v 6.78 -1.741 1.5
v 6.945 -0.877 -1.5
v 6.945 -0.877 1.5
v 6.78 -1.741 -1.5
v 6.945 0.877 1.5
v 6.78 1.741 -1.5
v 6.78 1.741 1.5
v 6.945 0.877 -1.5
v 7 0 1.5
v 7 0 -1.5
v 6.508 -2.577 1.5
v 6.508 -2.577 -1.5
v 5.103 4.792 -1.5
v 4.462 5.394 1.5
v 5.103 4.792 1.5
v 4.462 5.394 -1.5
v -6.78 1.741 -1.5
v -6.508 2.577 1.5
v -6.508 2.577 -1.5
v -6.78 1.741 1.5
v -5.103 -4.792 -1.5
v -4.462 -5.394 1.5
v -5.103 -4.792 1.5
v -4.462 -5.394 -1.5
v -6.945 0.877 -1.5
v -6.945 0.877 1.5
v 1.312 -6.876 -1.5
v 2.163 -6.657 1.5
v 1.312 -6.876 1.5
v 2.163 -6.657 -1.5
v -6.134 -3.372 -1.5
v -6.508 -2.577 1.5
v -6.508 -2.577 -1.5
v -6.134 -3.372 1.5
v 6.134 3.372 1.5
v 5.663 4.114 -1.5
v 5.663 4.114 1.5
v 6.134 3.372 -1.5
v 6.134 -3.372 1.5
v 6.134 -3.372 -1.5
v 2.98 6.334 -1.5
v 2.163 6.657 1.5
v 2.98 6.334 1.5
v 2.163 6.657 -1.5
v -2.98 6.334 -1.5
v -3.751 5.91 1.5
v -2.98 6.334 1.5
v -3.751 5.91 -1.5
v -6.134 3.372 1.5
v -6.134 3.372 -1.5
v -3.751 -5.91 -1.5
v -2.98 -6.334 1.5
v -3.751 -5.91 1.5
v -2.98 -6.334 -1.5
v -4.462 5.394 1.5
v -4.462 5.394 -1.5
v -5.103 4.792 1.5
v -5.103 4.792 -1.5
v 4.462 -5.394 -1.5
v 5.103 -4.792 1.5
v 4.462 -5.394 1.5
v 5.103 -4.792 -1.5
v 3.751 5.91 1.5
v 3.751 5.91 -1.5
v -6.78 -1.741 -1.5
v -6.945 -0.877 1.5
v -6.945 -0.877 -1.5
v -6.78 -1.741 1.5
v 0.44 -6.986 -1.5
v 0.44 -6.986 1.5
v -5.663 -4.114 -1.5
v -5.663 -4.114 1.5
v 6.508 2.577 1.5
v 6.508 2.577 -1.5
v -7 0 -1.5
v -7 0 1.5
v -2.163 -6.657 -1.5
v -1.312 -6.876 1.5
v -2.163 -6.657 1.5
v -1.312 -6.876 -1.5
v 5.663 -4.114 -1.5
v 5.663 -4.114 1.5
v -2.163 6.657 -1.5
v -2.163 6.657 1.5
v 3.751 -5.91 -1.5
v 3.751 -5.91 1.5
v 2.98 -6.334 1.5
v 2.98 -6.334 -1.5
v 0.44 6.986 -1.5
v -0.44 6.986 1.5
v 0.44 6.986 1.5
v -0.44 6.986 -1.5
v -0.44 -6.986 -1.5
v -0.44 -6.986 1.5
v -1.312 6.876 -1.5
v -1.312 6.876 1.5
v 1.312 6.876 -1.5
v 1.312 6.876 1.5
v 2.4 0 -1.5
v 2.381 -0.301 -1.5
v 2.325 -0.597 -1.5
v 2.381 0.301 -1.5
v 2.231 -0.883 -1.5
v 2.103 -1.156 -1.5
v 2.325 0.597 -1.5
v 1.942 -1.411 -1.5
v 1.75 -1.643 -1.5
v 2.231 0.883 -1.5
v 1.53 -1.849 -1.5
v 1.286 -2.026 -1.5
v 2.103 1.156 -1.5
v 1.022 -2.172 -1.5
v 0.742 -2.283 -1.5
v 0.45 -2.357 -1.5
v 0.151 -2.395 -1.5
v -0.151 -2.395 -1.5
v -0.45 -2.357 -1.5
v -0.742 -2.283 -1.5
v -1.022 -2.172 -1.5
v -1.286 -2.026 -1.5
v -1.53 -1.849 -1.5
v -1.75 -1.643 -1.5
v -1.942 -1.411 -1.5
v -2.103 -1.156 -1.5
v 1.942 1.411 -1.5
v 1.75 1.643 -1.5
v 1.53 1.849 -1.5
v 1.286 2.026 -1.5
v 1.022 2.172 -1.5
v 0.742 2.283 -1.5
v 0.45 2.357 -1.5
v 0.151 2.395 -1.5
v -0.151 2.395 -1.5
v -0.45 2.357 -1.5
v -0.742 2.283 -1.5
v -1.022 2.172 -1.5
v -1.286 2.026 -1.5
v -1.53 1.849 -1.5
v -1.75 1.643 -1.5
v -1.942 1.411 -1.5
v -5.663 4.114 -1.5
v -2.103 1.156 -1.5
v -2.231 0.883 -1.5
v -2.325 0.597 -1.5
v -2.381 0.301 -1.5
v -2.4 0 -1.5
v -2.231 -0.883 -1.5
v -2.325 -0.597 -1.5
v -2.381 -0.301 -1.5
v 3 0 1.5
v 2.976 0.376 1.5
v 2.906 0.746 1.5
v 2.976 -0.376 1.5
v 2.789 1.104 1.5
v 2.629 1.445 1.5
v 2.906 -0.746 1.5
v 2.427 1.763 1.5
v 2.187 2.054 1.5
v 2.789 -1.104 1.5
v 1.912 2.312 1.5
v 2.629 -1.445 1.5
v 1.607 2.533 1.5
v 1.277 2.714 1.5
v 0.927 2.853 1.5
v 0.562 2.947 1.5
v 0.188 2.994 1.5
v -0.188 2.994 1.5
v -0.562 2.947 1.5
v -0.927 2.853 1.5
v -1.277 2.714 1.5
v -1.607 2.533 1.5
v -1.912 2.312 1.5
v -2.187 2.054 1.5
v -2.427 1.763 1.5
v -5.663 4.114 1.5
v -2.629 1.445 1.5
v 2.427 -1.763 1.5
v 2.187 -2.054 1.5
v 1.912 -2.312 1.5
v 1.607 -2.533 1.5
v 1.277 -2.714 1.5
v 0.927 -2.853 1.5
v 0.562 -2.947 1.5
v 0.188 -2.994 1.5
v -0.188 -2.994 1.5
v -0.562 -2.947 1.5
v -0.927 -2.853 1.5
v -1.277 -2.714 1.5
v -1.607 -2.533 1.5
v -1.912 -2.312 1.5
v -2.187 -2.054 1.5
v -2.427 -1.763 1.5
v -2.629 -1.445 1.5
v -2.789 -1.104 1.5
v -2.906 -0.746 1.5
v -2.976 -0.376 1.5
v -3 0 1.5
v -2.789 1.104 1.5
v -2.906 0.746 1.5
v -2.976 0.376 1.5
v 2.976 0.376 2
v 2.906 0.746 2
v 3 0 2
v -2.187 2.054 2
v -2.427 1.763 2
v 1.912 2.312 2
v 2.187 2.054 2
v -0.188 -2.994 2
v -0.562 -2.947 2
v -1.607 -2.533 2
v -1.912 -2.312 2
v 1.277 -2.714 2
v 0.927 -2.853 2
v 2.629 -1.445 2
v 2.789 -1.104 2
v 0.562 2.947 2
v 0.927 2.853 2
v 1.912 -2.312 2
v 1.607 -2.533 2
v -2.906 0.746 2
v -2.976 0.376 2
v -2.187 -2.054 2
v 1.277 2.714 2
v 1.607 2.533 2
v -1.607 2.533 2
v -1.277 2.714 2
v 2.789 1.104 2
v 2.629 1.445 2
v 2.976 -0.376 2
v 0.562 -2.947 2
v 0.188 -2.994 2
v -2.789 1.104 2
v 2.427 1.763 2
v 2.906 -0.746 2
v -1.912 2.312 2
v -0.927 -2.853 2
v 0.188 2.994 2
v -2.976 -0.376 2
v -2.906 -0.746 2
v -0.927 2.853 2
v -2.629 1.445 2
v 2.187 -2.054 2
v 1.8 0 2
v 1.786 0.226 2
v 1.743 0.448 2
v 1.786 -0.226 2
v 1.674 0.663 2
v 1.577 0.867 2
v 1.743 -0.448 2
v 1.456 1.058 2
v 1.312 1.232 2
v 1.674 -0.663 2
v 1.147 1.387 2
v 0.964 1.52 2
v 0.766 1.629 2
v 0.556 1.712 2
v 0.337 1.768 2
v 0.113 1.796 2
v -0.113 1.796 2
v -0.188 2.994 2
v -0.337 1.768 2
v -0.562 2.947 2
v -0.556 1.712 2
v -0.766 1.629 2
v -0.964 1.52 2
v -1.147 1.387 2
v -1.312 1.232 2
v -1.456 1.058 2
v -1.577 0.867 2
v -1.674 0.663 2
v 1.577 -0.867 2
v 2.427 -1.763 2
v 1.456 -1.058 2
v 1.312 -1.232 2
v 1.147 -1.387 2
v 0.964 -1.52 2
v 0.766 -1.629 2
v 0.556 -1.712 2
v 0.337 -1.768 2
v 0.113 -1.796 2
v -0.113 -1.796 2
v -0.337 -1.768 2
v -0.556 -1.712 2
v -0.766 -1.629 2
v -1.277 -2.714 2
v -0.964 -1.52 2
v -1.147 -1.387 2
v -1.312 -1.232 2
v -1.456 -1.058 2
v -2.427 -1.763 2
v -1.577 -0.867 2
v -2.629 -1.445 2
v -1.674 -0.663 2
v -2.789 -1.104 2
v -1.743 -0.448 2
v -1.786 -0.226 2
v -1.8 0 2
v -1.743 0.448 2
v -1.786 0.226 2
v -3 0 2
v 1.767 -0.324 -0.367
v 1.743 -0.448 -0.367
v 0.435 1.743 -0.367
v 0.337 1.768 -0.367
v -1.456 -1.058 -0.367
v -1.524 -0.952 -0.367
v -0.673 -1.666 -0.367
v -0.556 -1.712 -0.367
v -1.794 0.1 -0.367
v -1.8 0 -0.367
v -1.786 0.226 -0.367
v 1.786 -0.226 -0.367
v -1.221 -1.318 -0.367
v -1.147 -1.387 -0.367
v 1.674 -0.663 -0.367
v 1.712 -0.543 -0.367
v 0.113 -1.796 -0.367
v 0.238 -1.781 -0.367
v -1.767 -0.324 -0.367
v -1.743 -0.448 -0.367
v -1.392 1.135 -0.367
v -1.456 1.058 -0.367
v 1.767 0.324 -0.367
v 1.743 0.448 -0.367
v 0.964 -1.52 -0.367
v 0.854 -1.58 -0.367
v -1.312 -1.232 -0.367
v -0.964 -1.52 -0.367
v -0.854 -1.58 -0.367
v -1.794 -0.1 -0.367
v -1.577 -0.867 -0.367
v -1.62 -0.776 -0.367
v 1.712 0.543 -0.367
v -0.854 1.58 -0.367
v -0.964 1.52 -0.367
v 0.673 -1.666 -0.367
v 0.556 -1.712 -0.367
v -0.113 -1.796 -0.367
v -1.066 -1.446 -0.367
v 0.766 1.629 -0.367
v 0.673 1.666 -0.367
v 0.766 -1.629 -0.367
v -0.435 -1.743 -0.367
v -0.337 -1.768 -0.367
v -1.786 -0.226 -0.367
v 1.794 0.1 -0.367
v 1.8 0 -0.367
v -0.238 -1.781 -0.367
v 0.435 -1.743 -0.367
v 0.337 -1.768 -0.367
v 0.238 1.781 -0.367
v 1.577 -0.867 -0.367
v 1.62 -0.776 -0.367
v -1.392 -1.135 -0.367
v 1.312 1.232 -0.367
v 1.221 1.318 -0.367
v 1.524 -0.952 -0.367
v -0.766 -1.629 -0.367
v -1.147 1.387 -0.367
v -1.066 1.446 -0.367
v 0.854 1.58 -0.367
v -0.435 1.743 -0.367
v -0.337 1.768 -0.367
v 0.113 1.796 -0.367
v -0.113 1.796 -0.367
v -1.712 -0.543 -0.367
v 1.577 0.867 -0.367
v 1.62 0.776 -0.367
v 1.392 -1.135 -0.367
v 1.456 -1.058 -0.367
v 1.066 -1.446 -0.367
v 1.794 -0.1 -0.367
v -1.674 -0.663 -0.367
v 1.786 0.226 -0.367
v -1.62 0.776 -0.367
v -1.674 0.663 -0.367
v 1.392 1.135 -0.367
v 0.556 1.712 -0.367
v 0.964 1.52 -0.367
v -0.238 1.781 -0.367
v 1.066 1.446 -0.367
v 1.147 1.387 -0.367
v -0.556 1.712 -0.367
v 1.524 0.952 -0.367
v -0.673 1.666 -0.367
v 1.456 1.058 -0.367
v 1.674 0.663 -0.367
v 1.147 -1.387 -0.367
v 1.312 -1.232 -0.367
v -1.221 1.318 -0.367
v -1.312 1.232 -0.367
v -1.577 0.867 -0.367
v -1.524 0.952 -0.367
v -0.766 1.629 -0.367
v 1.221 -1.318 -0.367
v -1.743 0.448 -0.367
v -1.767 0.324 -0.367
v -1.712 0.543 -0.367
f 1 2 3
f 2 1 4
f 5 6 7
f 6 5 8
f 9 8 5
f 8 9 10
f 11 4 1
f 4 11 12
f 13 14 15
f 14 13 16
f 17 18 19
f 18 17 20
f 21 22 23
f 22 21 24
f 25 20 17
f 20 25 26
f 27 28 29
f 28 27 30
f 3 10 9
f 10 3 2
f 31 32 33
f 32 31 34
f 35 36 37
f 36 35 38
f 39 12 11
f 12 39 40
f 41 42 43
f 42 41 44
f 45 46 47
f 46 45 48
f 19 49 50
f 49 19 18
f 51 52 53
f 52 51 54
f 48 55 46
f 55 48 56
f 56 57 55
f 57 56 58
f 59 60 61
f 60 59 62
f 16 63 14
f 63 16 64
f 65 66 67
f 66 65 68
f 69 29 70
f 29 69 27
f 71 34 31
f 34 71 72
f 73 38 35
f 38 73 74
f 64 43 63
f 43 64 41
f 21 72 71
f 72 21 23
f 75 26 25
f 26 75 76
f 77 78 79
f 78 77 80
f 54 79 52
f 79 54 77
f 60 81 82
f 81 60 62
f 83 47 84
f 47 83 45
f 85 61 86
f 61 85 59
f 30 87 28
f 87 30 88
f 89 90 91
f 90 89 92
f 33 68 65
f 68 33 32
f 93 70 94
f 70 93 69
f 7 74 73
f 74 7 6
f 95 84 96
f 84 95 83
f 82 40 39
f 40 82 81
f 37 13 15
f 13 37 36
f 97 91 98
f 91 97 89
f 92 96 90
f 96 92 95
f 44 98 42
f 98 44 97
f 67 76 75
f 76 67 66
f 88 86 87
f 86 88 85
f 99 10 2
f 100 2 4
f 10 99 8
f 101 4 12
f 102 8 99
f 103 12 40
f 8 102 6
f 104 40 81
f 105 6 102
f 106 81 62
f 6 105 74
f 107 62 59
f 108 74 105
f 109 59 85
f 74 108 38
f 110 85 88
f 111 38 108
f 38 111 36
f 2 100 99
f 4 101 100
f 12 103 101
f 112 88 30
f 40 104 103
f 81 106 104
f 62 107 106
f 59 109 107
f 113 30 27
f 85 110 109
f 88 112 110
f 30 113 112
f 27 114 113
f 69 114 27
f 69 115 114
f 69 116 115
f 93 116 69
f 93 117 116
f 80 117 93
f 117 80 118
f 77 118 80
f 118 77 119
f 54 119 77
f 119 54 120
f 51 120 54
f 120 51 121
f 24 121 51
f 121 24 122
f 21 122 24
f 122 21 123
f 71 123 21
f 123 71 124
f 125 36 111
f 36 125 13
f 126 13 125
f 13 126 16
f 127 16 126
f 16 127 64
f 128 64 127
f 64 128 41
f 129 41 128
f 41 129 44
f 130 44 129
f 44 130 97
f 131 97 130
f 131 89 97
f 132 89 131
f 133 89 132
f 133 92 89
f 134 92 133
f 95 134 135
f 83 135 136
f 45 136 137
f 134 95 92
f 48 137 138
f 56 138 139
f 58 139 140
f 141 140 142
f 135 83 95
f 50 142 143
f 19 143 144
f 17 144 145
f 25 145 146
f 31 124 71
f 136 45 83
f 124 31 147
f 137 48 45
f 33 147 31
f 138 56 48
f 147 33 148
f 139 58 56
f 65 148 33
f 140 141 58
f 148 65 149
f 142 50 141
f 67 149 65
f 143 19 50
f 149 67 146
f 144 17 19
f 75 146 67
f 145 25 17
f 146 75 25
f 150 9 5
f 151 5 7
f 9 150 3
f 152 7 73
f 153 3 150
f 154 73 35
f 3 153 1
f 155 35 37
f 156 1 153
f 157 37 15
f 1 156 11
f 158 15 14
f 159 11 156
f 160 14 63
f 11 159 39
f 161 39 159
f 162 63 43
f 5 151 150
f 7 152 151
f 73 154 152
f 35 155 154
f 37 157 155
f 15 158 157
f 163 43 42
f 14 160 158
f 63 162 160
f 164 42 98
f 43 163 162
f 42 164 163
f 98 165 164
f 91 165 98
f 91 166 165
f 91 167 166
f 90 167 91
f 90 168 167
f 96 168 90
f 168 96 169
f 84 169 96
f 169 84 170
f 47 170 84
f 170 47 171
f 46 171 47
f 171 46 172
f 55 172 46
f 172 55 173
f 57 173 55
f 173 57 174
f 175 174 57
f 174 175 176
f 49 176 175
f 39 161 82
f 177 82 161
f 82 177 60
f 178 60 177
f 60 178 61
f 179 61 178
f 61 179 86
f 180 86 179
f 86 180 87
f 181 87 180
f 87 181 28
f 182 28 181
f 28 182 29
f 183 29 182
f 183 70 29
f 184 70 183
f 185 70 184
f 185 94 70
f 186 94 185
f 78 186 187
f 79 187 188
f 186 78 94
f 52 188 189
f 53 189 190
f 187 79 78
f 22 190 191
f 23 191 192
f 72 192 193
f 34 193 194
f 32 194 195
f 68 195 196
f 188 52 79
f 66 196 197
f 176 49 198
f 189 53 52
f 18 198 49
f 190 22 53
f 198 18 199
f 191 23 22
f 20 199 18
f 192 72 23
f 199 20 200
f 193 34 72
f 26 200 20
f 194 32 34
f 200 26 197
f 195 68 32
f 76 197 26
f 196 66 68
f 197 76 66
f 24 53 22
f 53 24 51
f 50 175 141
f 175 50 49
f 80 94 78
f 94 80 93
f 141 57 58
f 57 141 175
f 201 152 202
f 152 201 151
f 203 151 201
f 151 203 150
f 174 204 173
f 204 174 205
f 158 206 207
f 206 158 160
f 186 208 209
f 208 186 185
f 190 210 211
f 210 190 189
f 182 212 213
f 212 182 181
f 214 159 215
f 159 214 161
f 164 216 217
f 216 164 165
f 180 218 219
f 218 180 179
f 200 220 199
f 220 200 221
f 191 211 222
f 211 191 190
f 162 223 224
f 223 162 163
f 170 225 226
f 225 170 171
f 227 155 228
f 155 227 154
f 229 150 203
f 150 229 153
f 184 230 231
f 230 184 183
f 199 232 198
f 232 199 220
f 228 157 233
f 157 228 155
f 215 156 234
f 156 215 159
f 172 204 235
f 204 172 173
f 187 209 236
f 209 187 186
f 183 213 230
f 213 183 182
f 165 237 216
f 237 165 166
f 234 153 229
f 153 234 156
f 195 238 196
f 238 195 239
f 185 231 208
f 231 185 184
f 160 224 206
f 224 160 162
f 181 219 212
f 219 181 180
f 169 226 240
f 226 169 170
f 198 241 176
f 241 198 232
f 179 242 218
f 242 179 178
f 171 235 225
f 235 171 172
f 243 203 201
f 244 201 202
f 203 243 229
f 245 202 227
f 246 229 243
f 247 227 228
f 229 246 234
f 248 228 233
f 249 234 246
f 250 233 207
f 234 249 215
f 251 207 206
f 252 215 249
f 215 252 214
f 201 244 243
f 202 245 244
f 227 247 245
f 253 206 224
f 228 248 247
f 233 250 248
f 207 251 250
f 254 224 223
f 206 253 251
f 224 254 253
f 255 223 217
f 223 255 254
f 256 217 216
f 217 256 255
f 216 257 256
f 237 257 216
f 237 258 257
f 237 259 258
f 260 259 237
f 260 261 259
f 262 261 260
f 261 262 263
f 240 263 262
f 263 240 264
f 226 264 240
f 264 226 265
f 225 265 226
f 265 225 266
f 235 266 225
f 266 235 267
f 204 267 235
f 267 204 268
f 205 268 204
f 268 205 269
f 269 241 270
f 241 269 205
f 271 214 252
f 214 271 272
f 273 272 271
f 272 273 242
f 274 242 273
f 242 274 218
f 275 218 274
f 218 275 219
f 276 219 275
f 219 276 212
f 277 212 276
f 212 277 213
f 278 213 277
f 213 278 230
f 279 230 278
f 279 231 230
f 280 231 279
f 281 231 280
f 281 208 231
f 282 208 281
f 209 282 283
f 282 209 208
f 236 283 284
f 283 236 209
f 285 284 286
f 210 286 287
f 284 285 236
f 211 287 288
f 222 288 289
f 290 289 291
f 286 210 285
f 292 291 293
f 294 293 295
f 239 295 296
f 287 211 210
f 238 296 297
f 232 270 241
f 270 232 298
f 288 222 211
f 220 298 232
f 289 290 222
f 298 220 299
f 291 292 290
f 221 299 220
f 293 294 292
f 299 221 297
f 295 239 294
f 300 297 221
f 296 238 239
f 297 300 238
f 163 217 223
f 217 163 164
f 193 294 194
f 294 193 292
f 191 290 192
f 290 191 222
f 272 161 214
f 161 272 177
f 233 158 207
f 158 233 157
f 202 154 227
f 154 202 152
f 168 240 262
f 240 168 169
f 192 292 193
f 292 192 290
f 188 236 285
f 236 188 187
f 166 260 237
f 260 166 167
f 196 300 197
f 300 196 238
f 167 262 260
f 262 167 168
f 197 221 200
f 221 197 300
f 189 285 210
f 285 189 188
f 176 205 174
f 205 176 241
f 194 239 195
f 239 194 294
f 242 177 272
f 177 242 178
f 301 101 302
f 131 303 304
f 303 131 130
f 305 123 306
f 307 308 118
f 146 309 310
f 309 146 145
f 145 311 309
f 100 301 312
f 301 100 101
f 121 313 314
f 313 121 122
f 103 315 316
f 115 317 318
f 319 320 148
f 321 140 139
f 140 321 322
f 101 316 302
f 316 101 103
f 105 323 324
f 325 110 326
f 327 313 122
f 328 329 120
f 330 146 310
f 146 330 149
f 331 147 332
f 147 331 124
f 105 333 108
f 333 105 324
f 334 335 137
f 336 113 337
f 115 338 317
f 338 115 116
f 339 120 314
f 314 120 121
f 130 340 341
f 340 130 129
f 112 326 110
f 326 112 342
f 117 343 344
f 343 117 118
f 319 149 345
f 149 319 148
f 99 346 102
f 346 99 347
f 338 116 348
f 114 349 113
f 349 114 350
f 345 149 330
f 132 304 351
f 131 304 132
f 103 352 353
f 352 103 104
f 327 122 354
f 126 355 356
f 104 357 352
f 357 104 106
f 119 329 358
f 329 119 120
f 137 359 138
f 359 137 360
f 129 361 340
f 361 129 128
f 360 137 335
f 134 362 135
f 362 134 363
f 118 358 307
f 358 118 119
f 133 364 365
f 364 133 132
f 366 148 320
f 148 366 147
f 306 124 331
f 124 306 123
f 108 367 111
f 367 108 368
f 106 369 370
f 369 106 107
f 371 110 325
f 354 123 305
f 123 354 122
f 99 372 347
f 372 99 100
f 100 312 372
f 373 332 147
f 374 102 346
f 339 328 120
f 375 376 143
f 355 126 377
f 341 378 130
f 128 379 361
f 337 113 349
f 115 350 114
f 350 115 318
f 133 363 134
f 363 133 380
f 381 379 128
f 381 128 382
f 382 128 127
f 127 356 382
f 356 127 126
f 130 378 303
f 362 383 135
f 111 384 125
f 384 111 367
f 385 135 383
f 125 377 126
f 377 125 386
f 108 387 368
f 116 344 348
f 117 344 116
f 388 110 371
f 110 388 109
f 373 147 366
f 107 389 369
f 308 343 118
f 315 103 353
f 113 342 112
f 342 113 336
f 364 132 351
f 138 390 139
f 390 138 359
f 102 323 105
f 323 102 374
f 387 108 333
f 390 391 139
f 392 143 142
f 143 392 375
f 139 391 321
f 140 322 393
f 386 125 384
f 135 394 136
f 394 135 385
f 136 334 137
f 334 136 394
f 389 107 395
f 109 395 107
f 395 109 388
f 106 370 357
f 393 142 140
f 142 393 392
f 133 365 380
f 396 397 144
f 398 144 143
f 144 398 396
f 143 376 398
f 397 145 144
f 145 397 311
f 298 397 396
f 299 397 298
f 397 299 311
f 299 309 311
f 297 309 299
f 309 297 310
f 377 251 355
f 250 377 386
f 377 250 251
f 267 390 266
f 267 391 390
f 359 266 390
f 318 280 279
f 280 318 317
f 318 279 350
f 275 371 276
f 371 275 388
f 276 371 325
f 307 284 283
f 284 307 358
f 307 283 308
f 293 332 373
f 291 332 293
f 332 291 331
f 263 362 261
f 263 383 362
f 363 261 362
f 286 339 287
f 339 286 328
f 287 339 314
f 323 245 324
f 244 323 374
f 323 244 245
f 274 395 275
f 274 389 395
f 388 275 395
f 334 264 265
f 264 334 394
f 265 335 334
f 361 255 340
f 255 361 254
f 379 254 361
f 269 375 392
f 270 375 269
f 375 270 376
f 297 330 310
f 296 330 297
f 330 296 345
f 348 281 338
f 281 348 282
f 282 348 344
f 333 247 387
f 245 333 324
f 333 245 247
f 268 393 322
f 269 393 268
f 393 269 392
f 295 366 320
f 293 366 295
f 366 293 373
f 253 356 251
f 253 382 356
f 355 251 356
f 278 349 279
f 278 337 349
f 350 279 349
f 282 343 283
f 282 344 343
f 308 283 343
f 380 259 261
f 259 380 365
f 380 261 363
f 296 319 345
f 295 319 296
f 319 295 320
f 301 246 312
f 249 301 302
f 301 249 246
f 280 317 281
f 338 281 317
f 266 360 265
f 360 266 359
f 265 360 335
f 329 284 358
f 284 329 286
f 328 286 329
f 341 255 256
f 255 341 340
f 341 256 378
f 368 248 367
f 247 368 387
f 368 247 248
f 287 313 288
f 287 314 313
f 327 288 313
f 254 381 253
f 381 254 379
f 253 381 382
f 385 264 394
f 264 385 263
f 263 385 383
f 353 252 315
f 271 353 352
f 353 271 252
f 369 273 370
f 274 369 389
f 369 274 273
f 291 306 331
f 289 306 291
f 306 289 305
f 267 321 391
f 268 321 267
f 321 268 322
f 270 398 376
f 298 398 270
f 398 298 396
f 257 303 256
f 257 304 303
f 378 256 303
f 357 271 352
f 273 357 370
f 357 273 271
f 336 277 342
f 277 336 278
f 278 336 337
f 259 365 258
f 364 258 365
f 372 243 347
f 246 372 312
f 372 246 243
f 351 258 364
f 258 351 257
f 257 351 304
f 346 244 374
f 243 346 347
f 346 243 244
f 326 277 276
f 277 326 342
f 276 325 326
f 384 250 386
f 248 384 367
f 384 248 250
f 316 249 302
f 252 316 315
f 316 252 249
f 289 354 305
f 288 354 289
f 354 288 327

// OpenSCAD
$fn = 50;


difference() {
	union() {
		translate(v = [0, 0, -1.5000000000]) {
			cylinder(h = 3, r = 7.0000000000);
		}
		translate(v = [0, 0, -1.5000000000]) {
			cylinder(h = 3.5000000000, r = 3.0000000000);
		}
	}
	union() {
		translate(v = [0, 0, -1.5000000000]) {
			rotate(a = [0, 180, 0]) {
				difference() {
					union() {
						translate(v = [0, 0, -1.7000000000]) {
							cylinder(h = 1.7000000000, r1 = 1.5000000000, r2 = 2.4000000000);
						}
						translate(v = [0, 0, -3.5000000000]) {
							cylinder(h = 3.5000000000, r = 1.5000000000);
						}
						translate(v = [0, 0, -3.5000000000]) {
							cylinder(h = 3.5000000000, r = 1.8000000000);
						}
						translate(v = [0, 0, -3.5000000000]) {
							cylinder(h = 3.5000000000, r = 1.5000000000);
						}
					}
					union();
				}
			}
		}
		translate(v = [0, 0, -100.0000000000]) {
			cylinder(h = 200, r = 1.5000000000);
		}
	}
}
